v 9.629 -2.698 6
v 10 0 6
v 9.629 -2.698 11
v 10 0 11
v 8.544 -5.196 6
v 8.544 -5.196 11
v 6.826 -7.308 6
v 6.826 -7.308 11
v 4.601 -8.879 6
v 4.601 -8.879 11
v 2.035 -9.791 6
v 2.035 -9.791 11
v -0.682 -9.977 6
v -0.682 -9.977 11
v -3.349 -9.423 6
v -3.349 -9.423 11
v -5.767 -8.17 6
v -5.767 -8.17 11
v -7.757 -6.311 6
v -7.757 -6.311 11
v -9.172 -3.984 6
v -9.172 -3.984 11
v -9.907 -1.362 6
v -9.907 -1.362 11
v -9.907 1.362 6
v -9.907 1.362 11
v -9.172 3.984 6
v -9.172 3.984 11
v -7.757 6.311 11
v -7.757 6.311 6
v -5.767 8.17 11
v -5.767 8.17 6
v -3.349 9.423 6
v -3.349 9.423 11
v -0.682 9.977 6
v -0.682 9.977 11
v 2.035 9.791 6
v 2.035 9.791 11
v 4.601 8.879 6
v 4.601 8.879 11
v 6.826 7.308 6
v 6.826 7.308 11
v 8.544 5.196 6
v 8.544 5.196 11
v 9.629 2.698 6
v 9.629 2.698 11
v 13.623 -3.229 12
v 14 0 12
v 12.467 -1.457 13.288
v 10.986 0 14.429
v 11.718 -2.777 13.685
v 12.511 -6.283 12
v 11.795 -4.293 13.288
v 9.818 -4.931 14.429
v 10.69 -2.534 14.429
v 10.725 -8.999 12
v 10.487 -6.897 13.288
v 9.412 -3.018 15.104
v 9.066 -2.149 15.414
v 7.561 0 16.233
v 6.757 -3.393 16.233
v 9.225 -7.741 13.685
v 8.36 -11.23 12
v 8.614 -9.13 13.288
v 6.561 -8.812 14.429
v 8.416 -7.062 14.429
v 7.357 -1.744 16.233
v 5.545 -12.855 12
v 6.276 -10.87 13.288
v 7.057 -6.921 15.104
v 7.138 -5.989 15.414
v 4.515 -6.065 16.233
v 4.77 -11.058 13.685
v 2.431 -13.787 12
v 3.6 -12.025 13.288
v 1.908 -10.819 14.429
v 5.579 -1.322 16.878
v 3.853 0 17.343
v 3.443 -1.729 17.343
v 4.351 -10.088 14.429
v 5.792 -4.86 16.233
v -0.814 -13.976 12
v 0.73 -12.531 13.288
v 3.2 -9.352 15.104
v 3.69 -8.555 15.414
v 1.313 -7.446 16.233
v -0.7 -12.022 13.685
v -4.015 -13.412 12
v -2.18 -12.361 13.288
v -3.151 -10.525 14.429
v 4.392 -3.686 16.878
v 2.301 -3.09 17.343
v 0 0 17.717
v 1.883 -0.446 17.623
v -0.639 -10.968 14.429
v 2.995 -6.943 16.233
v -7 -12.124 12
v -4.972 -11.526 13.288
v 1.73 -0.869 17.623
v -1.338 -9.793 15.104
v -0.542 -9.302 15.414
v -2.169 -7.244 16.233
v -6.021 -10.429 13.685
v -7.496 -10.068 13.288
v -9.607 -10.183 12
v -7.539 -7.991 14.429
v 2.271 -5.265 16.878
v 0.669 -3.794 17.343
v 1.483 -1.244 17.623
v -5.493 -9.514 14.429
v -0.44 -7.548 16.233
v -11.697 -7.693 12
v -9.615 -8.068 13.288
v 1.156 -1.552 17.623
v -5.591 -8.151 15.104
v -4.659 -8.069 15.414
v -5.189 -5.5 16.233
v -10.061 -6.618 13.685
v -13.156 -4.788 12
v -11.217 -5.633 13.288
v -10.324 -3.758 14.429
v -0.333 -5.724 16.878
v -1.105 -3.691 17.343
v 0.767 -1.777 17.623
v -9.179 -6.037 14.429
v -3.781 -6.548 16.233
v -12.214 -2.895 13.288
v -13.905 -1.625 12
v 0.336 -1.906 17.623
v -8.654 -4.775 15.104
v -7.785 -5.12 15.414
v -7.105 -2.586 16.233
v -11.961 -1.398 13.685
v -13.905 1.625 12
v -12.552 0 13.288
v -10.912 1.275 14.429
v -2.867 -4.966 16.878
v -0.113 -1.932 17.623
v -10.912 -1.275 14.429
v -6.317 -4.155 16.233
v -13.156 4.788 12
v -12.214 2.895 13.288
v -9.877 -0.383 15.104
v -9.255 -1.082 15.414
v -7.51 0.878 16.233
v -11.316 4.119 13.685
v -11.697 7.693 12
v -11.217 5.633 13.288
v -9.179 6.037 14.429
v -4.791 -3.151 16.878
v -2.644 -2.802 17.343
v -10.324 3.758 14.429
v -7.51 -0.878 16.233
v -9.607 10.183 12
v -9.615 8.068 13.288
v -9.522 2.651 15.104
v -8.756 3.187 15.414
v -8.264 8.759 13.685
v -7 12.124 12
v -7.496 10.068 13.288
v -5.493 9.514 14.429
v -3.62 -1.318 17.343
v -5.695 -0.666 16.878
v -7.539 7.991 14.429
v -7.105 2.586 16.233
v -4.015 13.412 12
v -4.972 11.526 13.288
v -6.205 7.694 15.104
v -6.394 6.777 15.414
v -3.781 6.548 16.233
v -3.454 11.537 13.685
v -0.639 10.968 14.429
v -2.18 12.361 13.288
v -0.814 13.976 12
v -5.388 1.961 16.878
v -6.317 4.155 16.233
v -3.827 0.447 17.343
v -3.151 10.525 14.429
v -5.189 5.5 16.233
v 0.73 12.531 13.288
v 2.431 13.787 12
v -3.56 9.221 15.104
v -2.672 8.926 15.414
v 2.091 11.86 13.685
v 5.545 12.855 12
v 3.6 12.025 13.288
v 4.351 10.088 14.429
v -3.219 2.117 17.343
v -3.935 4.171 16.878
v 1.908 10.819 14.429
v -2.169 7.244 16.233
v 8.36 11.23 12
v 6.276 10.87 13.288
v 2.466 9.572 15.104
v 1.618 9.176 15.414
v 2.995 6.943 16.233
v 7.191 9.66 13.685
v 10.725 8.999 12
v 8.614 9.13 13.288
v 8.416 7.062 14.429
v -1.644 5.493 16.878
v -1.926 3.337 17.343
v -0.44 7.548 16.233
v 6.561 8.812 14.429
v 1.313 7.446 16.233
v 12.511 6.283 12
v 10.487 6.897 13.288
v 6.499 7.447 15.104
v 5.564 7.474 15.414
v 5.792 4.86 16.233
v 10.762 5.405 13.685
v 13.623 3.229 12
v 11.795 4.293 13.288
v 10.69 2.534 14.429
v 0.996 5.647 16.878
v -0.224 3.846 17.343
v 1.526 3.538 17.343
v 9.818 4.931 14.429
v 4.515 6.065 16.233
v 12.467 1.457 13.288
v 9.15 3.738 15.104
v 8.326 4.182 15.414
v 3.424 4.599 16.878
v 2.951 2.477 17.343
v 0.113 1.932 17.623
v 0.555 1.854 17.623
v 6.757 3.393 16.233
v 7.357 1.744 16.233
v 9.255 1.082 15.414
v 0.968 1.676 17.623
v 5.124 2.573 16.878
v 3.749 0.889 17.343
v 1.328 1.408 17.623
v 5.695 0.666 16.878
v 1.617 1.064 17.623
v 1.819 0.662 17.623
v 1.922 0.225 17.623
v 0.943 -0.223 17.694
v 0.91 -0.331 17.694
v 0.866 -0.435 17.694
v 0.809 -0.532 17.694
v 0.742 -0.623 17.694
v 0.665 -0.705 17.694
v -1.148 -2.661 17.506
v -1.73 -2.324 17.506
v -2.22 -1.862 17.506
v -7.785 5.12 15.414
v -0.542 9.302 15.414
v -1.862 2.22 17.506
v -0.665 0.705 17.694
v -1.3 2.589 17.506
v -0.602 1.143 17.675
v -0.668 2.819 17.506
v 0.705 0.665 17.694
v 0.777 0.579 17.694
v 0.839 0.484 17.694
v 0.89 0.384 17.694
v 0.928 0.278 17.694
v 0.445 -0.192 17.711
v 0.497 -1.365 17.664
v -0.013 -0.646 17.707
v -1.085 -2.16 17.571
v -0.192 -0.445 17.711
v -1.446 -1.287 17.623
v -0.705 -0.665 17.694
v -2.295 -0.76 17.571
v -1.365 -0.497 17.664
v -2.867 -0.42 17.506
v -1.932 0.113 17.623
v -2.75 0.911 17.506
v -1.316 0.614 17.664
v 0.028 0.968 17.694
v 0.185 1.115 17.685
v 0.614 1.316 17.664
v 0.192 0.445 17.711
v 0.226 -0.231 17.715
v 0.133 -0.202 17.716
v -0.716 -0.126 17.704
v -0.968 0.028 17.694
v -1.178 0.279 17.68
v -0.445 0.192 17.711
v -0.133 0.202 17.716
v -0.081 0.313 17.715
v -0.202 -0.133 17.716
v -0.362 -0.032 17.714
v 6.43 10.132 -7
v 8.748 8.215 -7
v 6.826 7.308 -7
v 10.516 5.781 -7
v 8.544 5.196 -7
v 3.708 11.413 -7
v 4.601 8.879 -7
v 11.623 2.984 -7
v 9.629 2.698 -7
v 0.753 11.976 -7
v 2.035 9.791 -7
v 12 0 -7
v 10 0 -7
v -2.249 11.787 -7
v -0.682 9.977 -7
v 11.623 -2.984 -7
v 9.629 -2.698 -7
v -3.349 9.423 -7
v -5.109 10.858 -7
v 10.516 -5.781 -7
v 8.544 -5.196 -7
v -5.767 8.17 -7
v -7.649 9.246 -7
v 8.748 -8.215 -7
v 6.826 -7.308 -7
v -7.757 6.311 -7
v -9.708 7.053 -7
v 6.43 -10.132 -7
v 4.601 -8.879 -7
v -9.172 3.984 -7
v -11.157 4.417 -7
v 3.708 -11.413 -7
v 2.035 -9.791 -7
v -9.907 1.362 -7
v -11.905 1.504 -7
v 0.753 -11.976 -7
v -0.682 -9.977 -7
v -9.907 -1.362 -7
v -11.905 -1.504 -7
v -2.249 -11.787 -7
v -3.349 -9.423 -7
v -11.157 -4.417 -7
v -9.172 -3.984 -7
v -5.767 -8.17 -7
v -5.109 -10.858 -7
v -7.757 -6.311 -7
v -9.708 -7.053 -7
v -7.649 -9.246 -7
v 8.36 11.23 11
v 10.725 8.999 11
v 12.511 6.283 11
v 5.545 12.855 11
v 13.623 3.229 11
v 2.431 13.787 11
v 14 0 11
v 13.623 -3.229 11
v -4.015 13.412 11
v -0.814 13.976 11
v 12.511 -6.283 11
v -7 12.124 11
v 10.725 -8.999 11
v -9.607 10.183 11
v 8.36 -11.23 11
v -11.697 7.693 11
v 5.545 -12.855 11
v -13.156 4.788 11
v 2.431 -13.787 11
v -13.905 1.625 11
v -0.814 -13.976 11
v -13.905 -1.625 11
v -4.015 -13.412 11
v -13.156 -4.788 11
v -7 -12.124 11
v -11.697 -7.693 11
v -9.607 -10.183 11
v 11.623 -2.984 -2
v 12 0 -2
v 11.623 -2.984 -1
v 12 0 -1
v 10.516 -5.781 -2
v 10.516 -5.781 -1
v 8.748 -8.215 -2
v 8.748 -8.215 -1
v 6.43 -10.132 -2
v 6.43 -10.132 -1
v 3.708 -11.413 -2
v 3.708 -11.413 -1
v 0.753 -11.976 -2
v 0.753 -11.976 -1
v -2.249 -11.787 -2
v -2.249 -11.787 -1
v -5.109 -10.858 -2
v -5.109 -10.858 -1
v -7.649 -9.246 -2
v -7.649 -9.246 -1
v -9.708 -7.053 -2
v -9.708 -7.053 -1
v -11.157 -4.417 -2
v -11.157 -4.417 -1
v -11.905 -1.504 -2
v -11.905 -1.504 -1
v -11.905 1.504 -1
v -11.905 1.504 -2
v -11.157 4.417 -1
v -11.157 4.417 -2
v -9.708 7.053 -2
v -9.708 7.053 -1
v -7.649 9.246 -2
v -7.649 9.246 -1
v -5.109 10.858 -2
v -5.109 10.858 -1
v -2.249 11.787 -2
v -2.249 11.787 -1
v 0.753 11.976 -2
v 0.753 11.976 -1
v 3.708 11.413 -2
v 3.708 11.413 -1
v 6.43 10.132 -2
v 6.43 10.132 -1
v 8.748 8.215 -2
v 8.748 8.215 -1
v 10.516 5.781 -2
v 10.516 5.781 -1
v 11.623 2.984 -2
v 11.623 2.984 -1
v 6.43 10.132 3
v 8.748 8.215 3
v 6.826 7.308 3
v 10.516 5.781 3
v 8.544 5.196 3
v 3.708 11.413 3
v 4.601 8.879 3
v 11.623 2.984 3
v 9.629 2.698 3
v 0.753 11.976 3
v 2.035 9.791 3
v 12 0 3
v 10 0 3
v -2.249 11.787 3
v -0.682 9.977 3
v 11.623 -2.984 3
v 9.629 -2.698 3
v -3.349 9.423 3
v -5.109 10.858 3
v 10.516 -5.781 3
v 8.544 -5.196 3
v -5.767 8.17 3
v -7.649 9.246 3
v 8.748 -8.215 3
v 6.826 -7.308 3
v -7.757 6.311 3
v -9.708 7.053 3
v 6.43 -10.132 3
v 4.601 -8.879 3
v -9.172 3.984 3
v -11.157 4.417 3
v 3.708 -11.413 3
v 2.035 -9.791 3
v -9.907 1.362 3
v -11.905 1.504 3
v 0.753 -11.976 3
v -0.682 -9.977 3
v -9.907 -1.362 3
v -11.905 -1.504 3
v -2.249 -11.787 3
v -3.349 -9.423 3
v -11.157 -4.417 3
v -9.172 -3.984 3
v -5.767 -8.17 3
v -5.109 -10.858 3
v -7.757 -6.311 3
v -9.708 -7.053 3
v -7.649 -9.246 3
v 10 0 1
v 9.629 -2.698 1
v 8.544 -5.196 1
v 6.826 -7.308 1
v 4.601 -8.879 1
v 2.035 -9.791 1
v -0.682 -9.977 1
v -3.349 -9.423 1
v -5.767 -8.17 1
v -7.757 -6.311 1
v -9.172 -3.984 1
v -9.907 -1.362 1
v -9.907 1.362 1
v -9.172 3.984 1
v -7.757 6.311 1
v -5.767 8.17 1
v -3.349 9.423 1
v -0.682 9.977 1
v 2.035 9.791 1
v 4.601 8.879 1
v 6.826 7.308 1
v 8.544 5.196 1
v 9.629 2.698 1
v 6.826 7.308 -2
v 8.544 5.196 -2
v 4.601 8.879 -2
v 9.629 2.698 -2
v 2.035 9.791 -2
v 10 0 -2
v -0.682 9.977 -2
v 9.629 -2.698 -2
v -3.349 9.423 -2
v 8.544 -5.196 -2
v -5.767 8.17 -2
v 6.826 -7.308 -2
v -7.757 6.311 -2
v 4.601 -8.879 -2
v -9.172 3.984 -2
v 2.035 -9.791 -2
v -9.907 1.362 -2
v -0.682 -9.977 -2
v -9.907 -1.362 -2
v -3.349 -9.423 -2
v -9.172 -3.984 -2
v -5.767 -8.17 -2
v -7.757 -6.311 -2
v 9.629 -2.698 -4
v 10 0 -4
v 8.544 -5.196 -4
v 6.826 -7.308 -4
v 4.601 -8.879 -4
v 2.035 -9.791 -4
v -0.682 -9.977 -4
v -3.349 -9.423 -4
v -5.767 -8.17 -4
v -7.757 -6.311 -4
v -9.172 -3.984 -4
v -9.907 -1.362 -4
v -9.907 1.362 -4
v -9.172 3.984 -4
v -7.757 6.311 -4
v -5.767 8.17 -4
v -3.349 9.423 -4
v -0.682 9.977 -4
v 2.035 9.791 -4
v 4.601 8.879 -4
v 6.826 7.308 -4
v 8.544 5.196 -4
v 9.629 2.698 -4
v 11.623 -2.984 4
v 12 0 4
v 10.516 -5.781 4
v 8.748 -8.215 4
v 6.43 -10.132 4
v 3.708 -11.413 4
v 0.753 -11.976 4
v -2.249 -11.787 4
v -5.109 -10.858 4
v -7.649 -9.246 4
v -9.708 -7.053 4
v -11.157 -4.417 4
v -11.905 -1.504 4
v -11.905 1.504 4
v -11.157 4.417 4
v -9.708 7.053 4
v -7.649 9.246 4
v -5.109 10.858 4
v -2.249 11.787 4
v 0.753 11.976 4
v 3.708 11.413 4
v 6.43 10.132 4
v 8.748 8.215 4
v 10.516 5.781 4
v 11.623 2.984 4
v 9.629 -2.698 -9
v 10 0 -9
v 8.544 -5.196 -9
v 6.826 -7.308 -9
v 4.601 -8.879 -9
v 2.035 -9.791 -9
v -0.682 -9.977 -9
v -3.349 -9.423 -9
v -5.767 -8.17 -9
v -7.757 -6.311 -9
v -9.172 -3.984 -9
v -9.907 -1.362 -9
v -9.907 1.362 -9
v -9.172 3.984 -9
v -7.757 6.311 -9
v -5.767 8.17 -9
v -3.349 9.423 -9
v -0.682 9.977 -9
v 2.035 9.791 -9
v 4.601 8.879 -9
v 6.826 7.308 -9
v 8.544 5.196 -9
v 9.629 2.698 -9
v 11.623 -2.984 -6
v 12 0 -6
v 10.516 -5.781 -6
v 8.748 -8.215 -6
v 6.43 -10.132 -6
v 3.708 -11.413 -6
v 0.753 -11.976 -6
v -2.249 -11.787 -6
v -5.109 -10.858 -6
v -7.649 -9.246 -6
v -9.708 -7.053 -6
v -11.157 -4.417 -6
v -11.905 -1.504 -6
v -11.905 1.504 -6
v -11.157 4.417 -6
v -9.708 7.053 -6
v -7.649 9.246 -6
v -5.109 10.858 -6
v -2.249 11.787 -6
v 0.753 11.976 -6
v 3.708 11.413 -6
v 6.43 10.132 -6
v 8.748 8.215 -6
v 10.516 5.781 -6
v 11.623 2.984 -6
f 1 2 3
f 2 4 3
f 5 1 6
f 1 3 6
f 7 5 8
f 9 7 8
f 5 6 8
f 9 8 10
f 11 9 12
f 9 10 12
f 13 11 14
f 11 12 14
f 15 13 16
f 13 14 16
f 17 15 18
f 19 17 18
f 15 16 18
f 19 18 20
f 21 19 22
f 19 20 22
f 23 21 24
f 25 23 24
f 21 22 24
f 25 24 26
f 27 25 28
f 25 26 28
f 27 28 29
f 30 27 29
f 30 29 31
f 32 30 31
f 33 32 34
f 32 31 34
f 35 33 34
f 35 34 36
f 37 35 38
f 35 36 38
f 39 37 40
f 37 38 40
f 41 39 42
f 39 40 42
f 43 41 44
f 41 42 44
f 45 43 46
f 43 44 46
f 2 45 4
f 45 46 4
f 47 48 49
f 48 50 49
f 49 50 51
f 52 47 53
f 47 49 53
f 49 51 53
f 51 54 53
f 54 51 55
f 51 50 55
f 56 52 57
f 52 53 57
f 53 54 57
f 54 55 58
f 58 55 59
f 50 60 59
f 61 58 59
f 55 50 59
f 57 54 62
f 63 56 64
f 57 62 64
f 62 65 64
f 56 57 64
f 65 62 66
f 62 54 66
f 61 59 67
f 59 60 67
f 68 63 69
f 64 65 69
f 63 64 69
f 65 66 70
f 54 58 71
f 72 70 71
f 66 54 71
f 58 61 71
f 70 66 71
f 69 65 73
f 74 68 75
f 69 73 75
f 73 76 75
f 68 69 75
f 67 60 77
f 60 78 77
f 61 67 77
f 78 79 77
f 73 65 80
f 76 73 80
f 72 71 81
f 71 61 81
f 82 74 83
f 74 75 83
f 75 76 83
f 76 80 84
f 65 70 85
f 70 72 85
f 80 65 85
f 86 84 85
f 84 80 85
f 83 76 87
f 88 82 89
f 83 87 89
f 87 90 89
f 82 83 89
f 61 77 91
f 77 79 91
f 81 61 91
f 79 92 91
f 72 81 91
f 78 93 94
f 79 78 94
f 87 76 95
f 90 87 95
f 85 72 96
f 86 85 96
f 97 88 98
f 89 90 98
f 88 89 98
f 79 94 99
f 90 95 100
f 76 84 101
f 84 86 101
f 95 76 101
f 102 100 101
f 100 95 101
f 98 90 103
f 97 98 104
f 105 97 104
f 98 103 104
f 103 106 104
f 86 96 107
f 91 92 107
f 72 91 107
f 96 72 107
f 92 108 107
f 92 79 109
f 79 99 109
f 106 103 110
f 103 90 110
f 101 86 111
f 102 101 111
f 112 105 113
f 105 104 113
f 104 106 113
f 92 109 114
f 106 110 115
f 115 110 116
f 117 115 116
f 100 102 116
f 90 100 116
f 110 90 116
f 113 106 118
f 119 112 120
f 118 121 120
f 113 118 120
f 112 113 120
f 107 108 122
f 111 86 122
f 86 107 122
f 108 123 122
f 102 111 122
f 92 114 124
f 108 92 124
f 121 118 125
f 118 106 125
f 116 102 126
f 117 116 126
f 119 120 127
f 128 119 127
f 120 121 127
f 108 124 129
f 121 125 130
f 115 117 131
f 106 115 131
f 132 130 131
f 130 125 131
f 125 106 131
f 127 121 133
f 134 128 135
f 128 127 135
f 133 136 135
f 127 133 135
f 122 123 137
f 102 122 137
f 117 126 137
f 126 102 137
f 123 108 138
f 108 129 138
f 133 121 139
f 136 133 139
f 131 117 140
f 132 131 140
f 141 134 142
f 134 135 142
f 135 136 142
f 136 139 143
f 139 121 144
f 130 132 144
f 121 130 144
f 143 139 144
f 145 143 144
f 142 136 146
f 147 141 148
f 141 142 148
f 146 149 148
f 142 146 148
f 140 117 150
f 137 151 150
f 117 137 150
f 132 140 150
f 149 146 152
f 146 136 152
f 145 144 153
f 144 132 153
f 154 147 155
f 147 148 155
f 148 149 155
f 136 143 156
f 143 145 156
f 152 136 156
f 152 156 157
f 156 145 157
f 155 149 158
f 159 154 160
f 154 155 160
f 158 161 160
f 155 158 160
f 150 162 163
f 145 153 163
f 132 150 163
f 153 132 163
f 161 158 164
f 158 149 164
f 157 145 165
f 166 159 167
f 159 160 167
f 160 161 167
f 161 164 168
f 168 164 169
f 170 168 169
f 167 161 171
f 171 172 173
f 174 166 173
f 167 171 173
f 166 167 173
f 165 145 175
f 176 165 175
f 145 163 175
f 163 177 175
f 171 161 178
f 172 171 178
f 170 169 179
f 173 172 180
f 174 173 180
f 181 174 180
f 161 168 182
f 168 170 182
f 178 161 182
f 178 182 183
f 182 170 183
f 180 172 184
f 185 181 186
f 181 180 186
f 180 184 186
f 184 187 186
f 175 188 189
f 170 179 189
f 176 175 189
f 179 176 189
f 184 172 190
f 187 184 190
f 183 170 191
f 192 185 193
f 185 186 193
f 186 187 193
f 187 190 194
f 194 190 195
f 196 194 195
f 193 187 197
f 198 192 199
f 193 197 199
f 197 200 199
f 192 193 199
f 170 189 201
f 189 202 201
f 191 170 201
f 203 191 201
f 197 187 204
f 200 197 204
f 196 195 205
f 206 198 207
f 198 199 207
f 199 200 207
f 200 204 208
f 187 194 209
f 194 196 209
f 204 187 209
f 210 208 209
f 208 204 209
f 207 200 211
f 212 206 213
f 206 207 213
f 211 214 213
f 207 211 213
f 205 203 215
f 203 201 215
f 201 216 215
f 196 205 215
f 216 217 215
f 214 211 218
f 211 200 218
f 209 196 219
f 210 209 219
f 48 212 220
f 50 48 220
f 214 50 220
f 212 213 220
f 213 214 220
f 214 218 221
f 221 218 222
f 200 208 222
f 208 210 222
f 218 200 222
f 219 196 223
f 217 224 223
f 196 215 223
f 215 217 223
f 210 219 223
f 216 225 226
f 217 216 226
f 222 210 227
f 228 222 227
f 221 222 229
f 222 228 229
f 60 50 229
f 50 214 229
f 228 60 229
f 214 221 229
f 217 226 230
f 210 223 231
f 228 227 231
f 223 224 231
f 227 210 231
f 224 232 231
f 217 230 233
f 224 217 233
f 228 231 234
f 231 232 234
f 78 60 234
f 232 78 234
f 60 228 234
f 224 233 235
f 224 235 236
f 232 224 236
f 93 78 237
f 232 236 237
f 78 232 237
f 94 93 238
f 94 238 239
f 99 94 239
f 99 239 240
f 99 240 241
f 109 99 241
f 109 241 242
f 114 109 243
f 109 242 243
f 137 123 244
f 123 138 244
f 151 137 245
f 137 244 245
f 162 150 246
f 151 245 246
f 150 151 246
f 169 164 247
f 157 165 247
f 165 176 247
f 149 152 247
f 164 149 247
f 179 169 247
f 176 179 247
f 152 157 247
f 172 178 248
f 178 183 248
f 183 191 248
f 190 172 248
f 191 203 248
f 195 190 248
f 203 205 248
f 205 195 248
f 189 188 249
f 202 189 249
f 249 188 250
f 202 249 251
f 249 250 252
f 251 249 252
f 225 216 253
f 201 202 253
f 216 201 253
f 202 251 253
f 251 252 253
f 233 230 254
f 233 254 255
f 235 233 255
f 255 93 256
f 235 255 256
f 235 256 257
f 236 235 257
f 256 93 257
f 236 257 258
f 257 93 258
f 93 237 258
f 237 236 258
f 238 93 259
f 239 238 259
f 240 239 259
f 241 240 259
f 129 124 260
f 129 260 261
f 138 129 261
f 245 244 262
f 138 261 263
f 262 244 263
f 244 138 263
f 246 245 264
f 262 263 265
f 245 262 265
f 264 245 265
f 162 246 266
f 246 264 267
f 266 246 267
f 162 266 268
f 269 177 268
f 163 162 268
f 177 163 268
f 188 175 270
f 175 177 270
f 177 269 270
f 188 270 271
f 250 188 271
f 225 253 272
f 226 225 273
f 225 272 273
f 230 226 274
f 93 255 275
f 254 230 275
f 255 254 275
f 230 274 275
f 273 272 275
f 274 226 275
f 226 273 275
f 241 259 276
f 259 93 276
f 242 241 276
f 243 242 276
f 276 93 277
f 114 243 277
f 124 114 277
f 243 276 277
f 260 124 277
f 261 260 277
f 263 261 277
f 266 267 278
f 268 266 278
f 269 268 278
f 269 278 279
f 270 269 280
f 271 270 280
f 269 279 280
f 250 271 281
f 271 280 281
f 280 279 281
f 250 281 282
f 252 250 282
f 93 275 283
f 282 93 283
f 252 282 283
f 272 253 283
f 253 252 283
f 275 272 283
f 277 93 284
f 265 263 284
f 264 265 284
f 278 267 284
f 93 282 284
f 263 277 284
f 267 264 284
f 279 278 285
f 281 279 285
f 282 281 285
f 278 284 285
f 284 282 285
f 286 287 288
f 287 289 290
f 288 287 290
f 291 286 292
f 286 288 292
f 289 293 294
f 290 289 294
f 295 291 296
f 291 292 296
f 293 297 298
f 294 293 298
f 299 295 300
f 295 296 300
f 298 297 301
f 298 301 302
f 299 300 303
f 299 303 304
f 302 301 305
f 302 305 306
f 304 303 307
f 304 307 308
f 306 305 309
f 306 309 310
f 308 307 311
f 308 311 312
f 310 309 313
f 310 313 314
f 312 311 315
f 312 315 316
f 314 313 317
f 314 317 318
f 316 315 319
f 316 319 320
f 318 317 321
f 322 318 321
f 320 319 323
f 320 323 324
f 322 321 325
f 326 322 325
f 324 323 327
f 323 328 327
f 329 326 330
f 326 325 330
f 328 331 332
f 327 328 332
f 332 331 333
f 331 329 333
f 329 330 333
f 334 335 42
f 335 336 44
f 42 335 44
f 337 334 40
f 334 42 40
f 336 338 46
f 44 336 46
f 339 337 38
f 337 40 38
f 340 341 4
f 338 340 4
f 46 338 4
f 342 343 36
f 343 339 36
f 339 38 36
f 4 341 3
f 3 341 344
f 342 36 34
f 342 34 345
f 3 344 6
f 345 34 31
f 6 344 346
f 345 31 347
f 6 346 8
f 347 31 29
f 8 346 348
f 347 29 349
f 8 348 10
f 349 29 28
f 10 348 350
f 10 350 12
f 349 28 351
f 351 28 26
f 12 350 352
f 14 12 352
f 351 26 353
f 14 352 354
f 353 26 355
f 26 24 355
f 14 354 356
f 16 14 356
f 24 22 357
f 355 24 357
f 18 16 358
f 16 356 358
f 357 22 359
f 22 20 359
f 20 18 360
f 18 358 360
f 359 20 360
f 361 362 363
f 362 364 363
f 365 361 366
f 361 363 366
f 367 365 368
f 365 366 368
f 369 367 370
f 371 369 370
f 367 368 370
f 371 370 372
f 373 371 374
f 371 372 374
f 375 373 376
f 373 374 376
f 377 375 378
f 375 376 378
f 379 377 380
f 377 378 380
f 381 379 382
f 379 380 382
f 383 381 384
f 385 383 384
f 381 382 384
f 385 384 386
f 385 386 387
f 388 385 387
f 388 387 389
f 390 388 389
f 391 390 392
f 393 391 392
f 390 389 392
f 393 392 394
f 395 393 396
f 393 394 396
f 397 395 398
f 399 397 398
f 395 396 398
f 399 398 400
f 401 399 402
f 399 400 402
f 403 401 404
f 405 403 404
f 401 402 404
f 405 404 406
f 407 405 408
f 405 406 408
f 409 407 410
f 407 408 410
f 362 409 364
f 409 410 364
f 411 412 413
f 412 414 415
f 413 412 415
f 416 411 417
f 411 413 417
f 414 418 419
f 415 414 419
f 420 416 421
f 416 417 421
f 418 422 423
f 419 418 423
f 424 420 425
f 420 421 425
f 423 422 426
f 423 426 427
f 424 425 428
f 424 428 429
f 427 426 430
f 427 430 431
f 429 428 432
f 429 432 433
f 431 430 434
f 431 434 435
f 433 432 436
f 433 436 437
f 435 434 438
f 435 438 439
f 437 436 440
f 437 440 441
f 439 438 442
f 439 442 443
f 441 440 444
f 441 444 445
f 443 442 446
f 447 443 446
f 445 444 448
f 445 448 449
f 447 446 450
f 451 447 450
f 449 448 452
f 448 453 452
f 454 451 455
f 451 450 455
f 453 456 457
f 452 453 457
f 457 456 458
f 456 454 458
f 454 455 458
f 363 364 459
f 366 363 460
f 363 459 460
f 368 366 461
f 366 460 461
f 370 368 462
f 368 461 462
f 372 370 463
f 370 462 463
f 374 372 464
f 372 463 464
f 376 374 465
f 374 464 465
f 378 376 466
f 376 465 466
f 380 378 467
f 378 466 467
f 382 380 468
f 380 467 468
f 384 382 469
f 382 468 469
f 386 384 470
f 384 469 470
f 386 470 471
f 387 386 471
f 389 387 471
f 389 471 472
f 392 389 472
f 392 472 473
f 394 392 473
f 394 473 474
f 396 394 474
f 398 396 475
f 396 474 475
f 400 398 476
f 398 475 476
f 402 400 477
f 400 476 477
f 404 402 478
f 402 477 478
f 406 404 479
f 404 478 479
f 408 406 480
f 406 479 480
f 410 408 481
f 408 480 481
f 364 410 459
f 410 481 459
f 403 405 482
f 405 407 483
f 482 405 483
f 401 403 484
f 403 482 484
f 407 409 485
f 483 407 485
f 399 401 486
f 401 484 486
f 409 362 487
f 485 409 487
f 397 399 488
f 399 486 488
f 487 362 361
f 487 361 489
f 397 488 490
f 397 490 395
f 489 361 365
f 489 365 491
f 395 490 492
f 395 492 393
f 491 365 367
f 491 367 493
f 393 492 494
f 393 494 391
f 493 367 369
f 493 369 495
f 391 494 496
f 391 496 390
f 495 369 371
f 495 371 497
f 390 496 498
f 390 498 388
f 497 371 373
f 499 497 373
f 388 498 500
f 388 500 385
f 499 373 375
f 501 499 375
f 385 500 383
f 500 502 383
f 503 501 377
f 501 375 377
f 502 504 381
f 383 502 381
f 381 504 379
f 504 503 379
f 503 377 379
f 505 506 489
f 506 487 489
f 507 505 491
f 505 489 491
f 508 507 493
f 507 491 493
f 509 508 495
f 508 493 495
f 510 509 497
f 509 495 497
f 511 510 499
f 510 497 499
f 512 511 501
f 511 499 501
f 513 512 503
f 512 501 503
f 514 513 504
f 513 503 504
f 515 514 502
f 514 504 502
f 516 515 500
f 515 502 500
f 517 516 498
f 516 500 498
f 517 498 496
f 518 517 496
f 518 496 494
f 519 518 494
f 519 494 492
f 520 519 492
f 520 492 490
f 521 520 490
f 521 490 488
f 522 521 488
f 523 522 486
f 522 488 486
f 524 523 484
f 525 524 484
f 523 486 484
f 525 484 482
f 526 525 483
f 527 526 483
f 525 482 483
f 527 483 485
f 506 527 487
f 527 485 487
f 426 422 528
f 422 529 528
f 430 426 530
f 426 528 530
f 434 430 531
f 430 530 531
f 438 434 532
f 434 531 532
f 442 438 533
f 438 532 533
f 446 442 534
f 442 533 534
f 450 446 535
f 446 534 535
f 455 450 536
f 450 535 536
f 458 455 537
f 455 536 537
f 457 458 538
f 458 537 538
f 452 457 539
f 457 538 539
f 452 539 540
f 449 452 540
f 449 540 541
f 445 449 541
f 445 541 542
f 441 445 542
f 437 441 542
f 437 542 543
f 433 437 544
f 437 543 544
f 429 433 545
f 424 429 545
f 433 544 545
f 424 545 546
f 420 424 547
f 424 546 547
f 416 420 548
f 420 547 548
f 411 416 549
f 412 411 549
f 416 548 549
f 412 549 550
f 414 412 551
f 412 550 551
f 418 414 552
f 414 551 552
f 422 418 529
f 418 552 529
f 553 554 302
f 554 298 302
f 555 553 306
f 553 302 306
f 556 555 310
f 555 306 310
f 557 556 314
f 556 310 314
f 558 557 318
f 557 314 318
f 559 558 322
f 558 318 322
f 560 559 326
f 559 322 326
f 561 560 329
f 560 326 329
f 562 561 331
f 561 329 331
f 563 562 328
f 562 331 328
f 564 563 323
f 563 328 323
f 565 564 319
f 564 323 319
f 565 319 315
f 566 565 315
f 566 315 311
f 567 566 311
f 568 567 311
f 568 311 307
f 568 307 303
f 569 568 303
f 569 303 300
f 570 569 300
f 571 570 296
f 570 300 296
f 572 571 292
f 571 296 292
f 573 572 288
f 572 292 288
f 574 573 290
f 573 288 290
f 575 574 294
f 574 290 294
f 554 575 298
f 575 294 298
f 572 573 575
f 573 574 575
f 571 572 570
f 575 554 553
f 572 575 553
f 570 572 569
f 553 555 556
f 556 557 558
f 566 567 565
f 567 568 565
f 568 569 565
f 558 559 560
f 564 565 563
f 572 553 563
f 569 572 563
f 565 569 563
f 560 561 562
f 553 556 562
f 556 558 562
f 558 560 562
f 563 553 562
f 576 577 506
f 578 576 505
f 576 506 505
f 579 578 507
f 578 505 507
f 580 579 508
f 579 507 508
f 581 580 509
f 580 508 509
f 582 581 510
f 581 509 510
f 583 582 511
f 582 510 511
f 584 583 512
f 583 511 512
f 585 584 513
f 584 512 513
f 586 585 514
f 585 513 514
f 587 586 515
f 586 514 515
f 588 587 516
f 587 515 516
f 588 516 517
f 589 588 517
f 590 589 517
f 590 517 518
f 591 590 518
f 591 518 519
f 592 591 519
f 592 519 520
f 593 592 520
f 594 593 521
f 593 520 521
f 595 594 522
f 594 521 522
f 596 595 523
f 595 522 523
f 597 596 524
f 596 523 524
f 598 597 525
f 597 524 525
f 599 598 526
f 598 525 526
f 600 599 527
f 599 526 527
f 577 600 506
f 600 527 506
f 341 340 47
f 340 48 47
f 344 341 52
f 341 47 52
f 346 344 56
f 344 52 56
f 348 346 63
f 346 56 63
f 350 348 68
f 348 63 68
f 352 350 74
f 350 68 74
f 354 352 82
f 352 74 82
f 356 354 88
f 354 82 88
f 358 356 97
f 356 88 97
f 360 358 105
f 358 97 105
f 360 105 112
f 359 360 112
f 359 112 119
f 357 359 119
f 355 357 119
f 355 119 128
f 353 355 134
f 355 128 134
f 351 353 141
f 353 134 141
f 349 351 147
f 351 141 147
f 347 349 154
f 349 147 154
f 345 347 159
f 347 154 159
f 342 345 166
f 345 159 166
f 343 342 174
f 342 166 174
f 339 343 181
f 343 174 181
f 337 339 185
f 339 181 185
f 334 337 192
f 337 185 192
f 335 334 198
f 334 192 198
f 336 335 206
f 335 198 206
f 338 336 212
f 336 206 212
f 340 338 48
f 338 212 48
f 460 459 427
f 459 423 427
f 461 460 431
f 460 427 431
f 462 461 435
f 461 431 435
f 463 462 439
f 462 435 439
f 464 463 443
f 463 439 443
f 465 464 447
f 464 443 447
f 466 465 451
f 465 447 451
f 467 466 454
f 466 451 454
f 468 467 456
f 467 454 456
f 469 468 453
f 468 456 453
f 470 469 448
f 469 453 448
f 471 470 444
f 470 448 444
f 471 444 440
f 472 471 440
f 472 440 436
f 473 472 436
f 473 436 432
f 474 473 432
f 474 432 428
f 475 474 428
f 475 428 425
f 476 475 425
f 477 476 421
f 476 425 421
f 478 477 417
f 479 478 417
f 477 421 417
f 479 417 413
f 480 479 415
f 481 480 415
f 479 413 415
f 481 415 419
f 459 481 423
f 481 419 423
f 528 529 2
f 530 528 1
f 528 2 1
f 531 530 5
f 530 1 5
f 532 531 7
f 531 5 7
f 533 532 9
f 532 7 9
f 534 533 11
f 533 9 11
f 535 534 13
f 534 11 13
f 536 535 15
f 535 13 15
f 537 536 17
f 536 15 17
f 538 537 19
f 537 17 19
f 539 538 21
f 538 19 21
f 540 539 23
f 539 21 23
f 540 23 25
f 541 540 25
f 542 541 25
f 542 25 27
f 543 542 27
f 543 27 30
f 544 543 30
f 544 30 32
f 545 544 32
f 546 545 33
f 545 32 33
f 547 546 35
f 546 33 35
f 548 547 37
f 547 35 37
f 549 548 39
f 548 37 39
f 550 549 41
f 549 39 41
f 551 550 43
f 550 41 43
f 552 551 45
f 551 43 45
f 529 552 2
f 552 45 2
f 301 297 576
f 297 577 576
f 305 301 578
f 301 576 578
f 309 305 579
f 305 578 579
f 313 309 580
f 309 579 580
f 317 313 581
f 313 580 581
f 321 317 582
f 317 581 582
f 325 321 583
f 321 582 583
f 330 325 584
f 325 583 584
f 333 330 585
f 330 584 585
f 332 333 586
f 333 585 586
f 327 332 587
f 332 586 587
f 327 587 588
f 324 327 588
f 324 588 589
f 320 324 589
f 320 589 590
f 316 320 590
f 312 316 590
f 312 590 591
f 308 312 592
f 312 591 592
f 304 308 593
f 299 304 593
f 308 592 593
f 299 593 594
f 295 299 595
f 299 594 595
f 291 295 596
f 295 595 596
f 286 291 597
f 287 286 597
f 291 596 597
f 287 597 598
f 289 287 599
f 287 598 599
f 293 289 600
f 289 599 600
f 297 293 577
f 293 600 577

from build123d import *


with BuildPart() as f1:
    # F0 (on Front) → F1 (revolve)
    with BuildSketch(Plane.XZ):
        with BuildLine():
            Line((0, -9), (10, -9))
            Line((10, -9), (10, -7))
            Line((10, -7), (12, -7))
            Line((12, -7), (12, -6))
            Line((12, -6), (10, -4))
            Line((10, -4), (10, -2))
            Line((10, -2), (12, -2))
            Line((12, -2), (12, -1))
            Line((12, -1), (10, 1))
            Line((10, 1), (10, 3))
            Line((10, 3), (12, 3))
            Line((12, 3), (12, 4))
            Line((12, 4), (10, 6))
            Line((10, 6), (10, 11))
            Line((10, 11), (14, 11))
            Line((14, 11), (14, 12))
            ThreePointArc((14, 12), (7.561179, 16.232774), (0, 17.717143))
            Line((0, 17.717143), (0, -9))
        make_face()
    revolve(axis=Axis((0, 0, 4.358572), (0, 0, -1)))


solid = f1.part
